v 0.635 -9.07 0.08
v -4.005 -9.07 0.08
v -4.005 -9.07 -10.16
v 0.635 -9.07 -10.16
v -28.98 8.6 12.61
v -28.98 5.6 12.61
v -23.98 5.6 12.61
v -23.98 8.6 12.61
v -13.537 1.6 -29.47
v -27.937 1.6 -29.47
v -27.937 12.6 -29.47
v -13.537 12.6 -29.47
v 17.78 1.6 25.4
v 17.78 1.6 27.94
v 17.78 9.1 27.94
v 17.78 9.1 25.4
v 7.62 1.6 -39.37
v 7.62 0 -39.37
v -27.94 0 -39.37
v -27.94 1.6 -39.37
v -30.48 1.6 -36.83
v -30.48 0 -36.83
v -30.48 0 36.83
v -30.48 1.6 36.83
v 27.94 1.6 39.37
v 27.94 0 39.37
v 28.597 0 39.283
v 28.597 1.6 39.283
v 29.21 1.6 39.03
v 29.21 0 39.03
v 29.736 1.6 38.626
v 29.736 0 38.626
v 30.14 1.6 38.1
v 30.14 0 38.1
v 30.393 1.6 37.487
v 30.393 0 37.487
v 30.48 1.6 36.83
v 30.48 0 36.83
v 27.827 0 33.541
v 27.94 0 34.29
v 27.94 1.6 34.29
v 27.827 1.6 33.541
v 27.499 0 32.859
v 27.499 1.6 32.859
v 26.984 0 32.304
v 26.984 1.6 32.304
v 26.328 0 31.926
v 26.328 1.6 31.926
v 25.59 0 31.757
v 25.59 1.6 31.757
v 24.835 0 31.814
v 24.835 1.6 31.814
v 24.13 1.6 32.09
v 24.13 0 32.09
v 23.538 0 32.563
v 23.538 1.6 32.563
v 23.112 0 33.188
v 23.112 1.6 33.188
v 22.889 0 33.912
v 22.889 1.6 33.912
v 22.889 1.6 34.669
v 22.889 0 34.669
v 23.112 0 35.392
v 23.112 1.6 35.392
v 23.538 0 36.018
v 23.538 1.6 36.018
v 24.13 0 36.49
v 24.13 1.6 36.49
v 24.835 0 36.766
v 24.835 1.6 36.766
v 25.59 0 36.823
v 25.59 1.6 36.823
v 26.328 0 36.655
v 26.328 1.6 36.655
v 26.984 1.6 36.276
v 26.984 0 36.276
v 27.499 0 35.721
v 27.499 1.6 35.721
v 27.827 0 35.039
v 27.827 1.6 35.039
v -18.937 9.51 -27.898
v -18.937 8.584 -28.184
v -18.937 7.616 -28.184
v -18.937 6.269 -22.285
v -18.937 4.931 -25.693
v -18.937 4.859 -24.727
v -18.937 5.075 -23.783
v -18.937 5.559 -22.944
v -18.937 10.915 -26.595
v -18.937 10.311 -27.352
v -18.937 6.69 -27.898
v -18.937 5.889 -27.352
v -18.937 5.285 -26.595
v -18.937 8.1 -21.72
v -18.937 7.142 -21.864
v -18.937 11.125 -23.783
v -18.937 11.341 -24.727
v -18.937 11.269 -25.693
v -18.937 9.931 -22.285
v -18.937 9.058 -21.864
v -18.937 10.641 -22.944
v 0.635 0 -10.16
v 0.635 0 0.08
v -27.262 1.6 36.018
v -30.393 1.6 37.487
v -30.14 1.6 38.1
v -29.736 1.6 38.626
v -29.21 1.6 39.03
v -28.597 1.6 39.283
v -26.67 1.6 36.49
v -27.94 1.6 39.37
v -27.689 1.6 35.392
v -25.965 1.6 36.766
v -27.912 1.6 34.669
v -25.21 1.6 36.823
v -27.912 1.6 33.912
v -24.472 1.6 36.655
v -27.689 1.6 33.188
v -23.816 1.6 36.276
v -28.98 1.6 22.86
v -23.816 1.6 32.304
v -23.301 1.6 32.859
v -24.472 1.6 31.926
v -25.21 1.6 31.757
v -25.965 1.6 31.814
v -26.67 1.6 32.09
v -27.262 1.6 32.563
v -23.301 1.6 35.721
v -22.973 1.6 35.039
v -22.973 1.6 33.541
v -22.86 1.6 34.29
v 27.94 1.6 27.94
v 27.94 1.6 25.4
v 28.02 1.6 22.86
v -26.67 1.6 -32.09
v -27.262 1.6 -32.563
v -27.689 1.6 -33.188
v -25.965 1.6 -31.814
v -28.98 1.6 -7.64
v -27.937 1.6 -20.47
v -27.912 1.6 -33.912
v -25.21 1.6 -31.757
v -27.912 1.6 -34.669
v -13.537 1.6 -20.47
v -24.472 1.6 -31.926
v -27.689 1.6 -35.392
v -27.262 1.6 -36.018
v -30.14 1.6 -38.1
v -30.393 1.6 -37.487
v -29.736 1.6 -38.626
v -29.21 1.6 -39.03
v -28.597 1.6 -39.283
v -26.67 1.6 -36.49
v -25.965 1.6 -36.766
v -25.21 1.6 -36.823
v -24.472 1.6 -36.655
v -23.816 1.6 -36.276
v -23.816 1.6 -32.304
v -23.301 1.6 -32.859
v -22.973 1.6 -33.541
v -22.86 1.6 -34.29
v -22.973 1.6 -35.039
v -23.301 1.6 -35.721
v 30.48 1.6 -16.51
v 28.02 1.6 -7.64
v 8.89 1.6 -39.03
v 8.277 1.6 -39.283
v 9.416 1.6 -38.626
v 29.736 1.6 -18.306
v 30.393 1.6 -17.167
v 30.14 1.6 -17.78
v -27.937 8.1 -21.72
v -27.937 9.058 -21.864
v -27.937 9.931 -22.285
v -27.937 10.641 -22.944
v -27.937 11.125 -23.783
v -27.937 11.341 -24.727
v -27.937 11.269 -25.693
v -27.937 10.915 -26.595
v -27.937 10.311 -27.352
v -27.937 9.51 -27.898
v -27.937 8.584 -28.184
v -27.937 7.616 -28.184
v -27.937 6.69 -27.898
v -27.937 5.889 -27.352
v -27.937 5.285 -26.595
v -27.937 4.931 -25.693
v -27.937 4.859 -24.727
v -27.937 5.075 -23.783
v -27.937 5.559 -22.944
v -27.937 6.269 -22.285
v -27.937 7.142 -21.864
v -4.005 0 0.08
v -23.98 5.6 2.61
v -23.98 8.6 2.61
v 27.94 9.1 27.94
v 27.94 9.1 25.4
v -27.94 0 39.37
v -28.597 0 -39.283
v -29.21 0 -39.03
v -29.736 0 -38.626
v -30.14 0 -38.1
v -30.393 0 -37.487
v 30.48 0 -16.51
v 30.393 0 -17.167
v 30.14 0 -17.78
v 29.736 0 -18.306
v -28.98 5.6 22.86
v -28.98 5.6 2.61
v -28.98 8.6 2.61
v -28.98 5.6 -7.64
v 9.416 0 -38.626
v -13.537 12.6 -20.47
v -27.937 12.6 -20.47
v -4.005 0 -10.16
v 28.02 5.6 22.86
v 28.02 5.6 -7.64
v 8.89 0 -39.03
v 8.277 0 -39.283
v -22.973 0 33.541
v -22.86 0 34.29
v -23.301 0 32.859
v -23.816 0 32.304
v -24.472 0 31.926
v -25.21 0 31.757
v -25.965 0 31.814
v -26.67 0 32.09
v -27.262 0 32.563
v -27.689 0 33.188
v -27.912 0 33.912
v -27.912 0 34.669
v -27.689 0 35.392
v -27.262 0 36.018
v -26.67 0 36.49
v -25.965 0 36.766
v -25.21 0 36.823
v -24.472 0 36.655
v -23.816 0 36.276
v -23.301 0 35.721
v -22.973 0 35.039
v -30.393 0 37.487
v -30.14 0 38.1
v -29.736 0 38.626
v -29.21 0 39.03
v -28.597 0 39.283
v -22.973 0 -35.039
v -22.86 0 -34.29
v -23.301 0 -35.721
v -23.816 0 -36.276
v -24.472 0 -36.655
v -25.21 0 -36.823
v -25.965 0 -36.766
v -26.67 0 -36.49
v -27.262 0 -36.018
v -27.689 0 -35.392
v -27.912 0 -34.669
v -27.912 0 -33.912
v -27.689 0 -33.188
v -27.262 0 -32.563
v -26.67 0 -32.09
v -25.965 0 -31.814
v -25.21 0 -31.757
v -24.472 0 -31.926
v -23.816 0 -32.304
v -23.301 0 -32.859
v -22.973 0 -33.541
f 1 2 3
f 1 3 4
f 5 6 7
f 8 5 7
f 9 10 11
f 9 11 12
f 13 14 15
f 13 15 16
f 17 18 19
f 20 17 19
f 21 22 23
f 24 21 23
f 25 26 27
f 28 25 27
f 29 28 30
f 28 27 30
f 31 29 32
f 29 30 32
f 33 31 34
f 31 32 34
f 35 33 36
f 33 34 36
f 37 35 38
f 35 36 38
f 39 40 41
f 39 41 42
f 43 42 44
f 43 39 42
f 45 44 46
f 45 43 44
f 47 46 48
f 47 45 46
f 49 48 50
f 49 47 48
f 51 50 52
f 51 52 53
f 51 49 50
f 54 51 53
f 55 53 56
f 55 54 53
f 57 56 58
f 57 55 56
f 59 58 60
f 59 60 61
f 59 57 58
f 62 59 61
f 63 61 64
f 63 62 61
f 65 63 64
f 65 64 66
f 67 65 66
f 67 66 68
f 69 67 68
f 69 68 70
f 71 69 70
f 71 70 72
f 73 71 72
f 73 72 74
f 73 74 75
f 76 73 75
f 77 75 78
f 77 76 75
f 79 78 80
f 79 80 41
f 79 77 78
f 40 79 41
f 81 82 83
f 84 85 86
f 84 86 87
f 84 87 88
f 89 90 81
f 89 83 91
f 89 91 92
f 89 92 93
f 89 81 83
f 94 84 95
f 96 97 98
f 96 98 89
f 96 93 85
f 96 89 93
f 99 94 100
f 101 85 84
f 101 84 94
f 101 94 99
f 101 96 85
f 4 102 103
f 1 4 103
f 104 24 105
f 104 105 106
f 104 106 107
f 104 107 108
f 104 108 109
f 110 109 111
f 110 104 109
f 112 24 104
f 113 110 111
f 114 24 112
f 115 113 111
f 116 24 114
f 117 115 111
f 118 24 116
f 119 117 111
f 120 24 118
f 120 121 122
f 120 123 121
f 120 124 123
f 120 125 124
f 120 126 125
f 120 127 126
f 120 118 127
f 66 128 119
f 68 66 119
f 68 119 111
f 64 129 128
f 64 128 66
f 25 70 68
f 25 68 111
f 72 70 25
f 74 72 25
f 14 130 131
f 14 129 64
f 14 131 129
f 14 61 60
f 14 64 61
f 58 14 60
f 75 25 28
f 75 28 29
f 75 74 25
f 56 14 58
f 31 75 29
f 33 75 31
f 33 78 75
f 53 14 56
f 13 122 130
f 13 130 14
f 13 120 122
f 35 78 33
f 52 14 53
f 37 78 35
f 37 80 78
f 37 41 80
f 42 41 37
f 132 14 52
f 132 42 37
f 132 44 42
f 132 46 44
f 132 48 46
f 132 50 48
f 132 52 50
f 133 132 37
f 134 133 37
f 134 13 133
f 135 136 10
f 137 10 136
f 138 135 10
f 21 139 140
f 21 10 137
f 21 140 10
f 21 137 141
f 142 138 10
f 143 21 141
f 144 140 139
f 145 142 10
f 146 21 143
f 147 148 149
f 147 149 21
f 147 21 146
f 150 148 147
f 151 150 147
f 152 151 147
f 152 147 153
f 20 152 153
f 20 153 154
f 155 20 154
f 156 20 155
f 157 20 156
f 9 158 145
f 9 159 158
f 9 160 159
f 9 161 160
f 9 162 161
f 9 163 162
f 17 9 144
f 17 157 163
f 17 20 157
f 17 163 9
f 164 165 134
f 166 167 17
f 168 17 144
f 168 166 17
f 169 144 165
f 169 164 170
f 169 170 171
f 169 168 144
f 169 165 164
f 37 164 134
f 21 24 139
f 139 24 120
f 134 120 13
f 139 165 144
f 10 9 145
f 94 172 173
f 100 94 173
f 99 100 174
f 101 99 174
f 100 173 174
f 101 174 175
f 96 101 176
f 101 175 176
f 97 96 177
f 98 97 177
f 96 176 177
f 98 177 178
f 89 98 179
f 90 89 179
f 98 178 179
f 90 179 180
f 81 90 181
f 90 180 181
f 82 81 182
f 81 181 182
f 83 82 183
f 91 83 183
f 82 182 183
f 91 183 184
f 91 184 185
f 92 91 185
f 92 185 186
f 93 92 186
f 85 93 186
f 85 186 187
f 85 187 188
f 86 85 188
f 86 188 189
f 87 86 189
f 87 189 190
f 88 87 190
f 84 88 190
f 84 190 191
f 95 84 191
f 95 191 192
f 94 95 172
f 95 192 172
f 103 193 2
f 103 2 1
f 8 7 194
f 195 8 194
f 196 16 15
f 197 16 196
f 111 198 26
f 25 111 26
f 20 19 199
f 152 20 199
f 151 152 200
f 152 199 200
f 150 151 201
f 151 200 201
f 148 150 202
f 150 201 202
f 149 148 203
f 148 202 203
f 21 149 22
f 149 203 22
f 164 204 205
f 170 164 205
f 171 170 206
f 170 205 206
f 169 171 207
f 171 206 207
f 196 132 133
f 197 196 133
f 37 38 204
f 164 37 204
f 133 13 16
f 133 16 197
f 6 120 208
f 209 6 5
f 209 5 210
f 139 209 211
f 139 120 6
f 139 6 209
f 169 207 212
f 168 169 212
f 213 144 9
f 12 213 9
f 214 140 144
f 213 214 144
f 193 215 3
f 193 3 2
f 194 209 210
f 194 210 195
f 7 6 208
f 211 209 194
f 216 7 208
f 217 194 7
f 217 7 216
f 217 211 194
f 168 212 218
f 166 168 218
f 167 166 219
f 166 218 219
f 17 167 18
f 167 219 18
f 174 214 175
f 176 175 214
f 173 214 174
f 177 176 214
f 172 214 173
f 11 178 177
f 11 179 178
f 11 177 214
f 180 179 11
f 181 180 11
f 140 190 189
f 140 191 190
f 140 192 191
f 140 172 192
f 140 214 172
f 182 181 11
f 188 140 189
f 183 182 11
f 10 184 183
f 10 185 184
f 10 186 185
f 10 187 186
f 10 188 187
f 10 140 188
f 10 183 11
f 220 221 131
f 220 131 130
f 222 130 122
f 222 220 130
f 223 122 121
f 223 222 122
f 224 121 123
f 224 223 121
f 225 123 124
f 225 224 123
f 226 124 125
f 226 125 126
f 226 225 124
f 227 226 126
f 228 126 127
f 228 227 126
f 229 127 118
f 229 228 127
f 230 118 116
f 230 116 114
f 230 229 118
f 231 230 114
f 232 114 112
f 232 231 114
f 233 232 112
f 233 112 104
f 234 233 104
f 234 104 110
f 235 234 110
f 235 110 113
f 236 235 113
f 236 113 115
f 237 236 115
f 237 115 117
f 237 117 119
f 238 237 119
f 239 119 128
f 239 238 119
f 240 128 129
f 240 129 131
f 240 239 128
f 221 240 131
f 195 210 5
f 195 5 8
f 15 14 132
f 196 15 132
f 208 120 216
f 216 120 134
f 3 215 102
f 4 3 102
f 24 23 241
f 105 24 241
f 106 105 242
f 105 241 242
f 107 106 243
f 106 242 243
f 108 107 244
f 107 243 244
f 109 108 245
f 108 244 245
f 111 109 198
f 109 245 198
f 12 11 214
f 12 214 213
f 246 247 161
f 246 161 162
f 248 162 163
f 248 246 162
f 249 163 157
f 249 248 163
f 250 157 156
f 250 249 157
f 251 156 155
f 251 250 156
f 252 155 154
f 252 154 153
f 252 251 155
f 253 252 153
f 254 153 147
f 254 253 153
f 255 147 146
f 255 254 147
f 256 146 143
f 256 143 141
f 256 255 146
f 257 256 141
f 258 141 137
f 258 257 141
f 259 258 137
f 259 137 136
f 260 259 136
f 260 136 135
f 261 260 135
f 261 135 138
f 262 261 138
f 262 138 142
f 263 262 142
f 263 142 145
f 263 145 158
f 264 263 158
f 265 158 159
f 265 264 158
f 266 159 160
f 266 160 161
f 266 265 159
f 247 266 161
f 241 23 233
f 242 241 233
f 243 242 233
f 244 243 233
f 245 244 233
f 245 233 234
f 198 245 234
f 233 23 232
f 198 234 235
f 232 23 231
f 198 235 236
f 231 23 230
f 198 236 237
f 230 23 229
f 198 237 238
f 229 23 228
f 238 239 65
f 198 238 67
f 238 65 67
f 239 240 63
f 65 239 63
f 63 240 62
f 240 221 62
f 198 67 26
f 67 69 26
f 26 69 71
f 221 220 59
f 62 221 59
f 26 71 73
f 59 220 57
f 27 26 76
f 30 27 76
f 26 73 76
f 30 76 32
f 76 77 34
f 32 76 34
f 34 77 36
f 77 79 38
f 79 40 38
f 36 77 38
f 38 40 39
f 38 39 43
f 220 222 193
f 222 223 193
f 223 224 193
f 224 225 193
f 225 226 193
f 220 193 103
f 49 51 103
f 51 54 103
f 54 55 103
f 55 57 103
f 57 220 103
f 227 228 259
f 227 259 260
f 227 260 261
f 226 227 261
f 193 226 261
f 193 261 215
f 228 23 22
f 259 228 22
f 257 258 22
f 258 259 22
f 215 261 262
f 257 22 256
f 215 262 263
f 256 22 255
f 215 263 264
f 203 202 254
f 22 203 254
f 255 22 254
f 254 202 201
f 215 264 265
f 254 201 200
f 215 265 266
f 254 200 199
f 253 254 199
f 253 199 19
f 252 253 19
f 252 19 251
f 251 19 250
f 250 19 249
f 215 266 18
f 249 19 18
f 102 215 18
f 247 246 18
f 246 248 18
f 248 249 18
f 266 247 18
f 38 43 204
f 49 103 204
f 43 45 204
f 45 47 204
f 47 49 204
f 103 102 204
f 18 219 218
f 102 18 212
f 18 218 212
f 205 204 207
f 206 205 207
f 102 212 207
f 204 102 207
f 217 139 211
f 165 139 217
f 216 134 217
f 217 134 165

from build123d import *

# Parameters (mm, degrees)
BOARD_DEPTH            = 1.6
BOARDSKETCH_3_R        = 2.54
BOARD_HOLES_DEPTH      = 1.6
PORT_SKETCH_W          = 14.4
PORT_SKETCH_H          = 9
BARREL_CONN_DEPTH      = 11
BARREL_SKETCH_R        = 3.25
BARREL_CONN_HOLE_DEPTH = 9
PORTSKETCH_3_W         = 10.16
PORTSKETCH_3_H         = 2.54
PIN_HEADER_DEPTH       = 7.5
PORTSKETCH_4_W         = 57
PORTSKETCH_4_H         = 30.5
ESP8266_DEPTH          = 4
USB_SKETCH_W           = 5
USB_SKETCH_H           = 10
USB_PORT_DEPTH         = 3
LM7805_SKETCH_W        = 4.64
LM7805_SKETCH_H        = 10.24
LM7805_TH_DEPTH        = 9.07


with BuildPart() as part:
    # Board_Sketch → Board (new body)
    with BuildSketch(Plane(origin=(0, 0, 0), x_dir=(1, 0, 0), z_dir=(0, 1, 0))):
        with BuildLine():
            Line((30.48, -36.83), (30.48, 16.51))
            ThreePointArc((30.48, 16.51), (30.286654013, 17.482015918), (29.736051224, 18.306051224))
            Line((29.736051224, 18.306051224), (9.416051224, 38.626051224))
            ThreePointArc((9.416051224, 38.626051224), (8.592015918, 39.176654013), (7.62, 39.37))
            Line((7.62, 39.37), (-27.94, 39.37))
            ThreePointArc((-27.94, 39.37), (-29.736051224, 38.626051224), (-30.48, 36.83))
            Line((-30.48, 36.83), (-30.48, -36.83))
            ThreePointArc((-30.48, -36.83), (-29.736051224, -38.626051224), (-27.94, -39.37))
            Line((-27.94, -39.37), (27.94, -39.37))
            ThreePointArc((27.94, -39.37), (29.736051224, -38.626051224), (30.48, -36.83))
        make_face()
    extrude(amount=BOARD_DEPTH)

    # BoardSketch<3> → Board_Holes (cut)
    with BuildSketch(Plane(origin=(0, 0, 0), x_dir=(1, 0, 0), z_dir=(0, 1, 0))):
        with Locations((-25.400144884, -34.290144884)):
            Circle(BOARDSKETCH_3_R)
        with Locations((25.400144884, -34.290144884)):
            Circle(BOARDSKETCH_3_R)
        with Locations((-25.400144884, 34.290144884)):
            Circle(BOARDSKETCH_3_R)
    extrude(amount=BOARD_HOLES_DEPTH, mode=Mode.SUBTRACT)

    # Port_Sketch → Barrel_Conn (add)
    with BuildSketch(Plane(origin=(0, 1.6, 0), x_dir=(1, 0, 0), z_dir=(0, 1, 0))):
        with Locations((-20.737, 24.97)):
            Rectangle(PORT_SKETCH_W, PORT_SKETCH_H)
    extrude(amount=BARREL_CONN_DEPTH)

    # Barrel_Sketch → Barrel_Conn_Hole (cut)
    with BuildSketch(Plane.ZY.offset(27.937)):
        with Locations((-24.97, 8.1)):
            Circle(BARREL_SKETCH_R)
    extrude(amount=-BARREL_CONN_HOLE_DEPTH, mode=Mode.SUBTRACT)

    # PortSketch<3> → Pin_Header (add)
    with BuildSketch(Plane(origin=(0, 1.6, 0), x_dir=(1, 0, 0), z_dir=(0, 1, 0))):
        with Locations((22.86, -26.67)):
            Rectangle(PORTSKETCH_3_W, PORTSKETCH_3_H)
    extrude(amount=PIN_HEADER_DEPTH)

    # PortSketch<4> → ESP8266 (add)
    with BuildSketch(Plane(origin=(0, 1.6, 0), x_dir=(1, 0, 0), z_dir=(0, 1, 0))):
        with Locations((-0.48, -7.61)):
            Rectangle(PORTSKETCH_4_W, PORTSKETCH_4_H)
    extrude(amount=ESP8266_DEPTH)

    # USB_Sketch → USB_Port (add)
    with BuildSketch(Plane(origin=(0, 5.6, 0), x_dir=(1, 0, 0), z_dir=(0, 1, 0))):
        with Locations((-26.48, -7.61)):
            Rectangle(USB_SKETCH_W, USB_SKETCH_H)
    extrude(amount=USB_PORT_DEPTH)

    # LM7805_Sketch → LM7805_TH (add)
    with BuildSketch(Plane.XZ):
        with Locations((-1.685, -5.04)):
            Rectangle(LM7805_SKETCH_W, LM7805_SKETCH_H)
    extrude(amount=LM7805_TH_DEPTH)


solid = part.part
